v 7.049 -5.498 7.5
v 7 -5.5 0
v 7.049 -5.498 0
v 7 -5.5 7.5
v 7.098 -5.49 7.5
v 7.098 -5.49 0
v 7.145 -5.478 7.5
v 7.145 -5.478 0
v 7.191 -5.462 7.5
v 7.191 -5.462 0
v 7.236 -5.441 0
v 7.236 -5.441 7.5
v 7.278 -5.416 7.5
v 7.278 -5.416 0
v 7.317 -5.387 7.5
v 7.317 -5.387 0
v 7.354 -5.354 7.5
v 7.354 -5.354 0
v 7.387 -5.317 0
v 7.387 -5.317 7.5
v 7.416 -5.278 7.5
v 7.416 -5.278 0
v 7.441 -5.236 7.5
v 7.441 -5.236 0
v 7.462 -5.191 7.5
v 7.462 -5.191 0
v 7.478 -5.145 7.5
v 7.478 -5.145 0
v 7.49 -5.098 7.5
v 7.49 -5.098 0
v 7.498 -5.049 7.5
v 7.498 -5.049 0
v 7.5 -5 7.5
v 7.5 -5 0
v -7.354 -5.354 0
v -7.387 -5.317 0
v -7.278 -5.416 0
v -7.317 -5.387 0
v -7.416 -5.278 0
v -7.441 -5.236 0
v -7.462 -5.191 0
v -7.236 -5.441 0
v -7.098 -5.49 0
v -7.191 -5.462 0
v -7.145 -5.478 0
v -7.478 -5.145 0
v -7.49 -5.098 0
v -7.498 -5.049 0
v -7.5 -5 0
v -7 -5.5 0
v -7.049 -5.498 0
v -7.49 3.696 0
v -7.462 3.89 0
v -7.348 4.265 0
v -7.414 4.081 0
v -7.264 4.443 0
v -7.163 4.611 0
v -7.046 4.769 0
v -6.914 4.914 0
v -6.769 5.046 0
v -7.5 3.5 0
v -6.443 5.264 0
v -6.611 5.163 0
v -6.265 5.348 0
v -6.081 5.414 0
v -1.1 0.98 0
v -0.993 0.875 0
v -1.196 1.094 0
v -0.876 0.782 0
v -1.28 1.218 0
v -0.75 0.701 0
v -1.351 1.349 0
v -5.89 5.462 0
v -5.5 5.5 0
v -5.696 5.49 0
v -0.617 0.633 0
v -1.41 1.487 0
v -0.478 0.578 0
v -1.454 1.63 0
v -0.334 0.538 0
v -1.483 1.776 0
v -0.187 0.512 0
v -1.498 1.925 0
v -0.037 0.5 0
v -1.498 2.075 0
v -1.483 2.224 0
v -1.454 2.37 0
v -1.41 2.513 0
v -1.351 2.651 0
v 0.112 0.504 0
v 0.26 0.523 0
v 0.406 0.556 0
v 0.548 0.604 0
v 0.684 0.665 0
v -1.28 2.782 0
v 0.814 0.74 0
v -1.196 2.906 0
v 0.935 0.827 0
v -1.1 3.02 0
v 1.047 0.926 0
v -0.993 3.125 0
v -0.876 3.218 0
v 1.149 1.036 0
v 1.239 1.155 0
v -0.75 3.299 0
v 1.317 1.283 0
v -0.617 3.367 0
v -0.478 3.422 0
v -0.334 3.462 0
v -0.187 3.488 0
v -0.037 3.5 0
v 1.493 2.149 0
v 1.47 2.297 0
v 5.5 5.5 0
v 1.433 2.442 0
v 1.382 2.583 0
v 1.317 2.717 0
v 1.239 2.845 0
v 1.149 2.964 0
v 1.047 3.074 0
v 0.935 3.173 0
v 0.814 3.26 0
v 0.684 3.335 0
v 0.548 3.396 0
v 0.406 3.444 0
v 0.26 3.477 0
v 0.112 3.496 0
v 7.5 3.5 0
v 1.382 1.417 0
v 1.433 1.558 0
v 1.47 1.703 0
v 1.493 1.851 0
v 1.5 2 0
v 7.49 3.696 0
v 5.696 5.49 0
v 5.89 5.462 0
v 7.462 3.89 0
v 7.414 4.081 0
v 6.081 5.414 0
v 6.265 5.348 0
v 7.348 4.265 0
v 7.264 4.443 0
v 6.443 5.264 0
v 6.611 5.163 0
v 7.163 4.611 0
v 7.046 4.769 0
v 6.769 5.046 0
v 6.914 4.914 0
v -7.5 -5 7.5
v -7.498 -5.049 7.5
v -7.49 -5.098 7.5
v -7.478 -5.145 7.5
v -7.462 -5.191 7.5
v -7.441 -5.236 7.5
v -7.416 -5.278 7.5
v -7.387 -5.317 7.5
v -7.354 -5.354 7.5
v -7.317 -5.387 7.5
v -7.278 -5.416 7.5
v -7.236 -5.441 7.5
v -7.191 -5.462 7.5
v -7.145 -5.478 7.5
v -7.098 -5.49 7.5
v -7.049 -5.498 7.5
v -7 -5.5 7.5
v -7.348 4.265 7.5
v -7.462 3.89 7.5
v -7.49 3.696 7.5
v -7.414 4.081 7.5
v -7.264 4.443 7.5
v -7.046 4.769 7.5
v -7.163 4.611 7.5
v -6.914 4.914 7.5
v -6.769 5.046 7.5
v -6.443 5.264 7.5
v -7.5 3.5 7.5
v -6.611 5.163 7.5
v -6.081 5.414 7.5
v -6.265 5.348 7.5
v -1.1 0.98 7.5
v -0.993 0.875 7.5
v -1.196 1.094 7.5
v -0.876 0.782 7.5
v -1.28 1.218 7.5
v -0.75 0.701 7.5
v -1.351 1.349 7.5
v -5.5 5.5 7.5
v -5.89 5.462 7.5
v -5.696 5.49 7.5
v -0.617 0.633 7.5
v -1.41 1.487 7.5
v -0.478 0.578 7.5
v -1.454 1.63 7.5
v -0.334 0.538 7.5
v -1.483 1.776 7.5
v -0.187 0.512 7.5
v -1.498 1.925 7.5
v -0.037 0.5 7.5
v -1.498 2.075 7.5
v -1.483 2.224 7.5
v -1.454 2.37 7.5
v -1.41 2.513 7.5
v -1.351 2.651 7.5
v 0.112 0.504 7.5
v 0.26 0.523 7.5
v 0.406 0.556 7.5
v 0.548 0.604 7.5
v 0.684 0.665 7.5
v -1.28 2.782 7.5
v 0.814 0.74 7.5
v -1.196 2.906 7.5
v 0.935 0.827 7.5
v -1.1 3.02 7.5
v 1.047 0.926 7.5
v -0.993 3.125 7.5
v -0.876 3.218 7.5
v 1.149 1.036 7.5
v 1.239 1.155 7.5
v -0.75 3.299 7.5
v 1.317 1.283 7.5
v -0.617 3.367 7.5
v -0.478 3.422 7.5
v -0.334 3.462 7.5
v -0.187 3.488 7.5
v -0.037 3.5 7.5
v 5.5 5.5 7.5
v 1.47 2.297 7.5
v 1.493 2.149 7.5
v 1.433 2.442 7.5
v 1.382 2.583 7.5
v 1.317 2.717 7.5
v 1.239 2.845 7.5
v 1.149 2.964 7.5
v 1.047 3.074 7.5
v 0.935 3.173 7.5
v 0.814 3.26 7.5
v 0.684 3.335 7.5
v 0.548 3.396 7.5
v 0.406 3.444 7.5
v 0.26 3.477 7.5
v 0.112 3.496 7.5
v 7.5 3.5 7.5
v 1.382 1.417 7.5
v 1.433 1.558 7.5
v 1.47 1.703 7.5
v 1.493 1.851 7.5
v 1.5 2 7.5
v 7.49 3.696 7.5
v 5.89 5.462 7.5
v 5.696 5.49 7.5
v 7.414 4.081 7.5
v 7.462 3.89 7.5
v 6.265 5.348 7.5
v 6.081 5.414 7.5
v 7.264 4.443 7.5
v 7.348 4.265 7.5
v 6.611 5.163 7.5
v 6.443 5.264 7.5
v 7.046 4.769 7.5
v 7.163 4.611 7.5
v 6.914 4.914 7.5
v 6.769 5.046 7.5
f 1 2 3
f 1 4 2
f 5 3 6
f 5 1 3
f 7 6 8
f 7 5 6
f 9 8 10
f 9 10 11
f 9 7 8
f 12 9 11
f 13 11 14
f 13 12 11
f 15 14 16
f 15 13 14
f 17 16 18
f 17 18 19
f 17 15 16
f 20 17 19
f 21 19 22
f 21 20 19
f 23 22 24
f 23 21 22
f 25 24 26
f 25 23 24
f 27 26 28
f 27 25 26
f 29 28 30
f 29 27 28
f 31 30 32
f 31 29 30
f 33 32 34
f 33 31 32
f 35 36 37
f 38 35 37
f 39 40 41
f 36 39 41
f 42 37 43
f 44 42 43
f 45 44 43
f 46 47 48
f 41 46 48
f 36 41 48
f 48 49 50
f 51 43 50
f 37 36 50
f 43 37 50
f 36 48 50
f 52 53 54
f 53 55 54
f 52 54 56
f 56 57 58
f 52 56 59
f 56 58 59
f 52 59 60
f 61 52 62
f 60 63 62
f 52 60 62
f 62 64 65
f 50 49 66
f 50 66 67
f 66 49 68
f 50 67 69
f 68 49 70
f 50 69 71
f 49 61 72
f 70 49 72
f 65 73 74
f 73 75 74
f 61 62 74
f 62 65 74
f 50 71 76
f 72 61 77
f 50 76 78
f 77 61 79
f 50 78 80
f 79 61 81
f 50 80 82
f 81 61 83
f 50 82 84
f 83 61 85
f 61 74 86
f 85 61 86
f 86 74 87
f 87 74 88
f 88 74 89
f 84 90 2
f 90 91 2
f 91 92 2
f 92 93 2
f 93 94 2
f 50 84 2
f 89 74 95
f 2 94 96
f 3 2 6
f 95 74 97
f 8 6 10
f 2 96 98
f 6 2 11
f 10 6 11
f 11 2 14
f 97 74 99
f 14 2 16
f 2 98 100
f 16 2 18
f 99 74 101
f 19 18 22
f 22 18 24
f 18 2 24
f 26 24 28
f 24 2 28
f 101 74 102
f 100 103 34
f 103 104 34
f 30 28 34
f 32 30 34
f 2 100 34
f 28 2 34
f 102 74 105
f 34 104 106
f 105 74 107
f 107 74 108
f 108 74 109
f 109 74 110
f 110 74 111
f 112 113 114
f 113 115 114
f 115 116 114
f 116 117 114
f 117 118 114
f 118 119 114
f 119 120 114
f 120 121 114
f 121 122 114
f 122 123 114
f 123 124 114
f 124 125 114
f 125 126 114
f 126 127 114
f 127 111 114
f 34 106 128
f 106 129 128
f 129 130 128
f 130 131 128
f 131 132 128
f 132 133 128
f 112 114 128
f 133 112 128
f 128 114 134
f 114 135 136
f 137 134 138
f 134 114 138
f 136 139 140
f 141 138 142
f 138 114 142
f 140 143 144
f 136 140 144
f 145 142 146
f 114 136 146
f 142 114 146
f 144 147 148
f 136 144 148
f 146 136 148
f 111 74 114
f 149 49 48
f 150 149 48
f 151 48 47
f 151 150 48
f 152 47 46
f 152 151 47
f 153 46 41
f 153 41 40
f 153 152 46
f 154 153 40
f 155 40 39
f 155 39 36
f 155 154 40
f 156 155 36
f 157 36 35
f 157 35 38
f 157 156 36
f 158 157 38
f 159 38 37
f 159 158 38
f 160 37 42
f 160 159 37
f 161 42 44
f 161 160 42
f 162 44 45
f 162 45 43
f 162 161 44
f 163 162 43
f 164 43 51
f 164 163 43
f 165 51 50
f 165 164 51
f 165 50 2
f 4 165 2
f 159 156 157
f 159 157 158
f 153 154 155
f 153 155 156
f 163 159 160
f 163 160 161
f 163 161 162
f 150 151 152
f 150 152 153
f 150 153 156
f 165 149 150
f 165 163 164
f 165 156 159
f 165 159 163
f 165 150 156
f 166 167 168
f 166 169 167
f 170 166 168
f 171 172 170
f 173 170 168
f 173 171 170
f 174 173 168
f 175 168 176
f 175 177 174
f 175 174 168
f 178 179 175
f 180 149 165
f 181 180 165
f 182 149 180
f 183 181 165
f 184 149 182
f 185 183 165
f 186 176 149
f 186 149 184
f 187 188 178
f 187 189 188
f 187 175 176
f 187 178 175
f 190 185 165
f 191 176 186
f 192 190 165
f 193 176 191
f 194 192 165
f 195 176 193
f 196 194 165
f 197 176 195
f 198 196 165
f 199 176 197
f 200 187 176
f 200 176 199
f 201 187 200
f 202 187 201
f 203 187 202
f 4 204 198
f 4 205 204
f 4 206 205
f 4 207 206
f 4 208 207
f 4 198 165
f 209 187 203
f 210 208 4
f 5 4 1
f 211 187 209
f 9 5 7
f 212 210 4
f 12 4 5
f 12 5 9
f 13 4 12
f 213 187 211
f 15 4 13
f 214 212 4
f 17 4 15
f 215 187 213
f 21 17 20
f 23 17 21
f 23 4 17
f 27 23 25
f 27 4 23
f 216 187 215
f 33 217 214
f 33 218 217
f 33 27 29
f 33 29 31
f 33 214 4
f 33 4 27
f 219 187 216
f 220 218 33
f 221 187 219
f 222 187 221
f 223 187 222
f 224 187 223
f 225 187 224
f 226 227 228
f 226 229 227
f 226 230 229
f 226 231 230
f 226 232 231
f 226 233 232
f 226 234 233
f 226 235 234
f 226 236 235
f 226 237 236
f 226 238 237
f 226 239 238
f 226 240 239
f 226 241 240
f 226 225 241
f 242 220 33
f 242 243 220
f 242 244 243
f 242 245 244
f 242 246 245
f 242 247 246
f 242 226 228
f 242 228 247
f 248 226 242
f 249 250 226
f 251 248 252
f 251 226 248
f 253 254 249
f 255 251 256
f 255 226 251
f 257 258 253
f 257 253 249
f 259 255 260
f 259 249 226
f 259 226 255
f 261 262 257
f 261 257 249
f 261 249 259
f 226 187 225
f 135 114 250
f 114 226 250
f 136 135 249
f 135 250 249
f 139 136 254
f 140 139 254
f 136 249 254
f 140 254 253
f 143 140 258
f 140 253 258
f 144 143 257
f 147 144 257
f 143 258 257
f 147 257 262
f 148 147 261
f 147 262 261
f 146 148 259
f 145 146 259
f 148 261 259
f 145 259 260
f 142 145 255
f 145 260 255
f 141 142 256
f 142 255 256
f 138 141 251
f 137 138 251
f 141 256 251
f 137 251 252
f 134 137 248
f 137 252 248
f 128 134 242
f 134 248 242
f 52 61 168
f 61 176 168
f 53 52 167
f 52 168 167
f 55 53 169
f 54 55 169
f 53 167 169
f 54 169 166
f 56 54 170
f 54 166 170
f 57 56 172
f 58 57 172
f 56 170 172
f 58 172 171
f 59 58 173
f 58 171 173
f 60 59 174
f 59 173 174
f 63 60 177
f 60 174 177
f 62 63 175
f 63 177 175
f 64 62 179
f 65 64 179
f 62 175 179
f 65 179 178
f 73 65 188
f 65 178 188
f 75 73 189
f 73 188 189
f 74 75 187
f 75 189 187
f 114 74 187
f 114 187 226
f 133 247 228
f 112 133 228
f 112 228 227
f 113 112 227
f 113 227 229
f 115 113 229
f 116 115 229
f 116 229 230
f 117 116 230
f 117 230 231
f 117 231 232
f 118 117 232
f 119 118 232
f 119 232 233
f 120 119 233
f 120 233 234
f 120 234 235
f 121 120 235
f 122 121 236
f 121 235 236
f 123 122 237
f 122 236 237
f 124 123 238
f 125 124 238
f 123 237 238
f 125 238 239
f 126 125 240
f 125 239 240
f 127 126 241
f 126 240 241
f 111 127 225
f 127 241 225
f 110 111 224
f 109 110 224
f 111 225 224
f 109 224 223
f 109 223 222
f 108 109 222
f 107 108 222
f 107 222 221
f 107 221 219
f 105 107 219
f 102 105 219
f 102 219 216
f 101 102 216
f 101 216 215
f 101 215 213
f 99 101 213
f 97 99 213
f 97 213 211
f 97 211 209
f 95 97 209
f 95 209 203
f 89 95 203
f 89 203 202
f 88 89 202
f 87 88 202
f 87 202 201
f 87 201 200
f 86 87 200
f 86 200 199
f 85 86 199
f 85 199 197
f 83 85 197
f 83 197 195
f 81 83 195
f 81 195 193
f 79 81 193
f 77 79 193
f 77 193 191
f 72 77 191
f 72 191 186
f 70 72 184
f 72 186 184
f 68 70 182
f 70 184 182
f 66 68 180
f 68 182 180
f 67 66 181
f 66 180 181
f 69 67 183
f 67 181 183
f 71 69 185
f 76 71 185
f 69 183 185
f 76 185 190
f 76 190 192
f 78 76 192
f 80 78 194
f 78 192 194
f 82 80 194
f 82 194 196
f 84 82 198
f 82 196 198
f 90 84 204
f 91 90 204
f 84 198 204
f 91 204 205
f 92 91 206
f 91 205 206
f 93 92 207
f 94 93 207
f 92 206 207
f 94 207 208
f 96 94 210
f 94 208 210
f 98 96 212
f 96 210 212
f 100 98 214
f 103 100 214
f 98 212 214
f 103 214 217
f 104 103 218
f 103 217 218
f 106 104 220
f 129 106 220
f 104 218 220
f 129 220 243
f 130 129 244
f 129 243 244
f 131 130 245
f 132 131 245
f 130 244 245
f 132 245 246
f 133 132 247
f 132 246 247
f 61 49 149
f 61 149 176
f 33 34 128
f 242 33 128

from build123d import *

# Parameters (mm, degrees)
ESQUISSE1_W             = 15
ESQUISSE1_H             = 11
BOSS_EXTRU_1_DEPTH      = 7.5
ESQUISSE2_R             = 1.5
ENL_V_MAT_EXTRU_1_DEPTH = 12.947803145
CONG_1_R                = 2
CONG_2_R                = 0.5


with BuildPart() as part:
    # Esquisse1 → Boss.-Extru.1 (new body)
    with BuildSketch(Plane.XY):
        Rectangle(ESQUISSE1_W, ESQUISSE1_H)
    extrude(amount=BOSS_EXTRU_1_DEPTH)

    # Esquisse2 → Enlèv. mat.-Extru.1 (cut, through all)
    with BuildSketch(Plane.XY.offset(7.5)):
        with Locations((0, 2)):
            Circle(ESQUISSE2_R)
    extrude(amount=-ENL_V_MAT_EXTRU_1_DEPTH, mode=Mode.SUBTRACT)

    # Congé1
    cong_1_edges = [part.edges().sort_by_distance(p)[0] for p in [
        (-7.5, 5.5, 3.75),
        (7.5, 5.5, 3.75),
    ]]
    fillet(cong_1_edges, radius=CONG_1_R)

    # Congé2
    cong_2_edges = [part.edges().sort_by_distance(p)[0] for p in [
        (7.5, -5.5, 3.75),
        (-7.5, -5.5, 3.75),
    ]]
    fillet(cong_2_edges, radius=CONG_2_R)


solid = part.part
